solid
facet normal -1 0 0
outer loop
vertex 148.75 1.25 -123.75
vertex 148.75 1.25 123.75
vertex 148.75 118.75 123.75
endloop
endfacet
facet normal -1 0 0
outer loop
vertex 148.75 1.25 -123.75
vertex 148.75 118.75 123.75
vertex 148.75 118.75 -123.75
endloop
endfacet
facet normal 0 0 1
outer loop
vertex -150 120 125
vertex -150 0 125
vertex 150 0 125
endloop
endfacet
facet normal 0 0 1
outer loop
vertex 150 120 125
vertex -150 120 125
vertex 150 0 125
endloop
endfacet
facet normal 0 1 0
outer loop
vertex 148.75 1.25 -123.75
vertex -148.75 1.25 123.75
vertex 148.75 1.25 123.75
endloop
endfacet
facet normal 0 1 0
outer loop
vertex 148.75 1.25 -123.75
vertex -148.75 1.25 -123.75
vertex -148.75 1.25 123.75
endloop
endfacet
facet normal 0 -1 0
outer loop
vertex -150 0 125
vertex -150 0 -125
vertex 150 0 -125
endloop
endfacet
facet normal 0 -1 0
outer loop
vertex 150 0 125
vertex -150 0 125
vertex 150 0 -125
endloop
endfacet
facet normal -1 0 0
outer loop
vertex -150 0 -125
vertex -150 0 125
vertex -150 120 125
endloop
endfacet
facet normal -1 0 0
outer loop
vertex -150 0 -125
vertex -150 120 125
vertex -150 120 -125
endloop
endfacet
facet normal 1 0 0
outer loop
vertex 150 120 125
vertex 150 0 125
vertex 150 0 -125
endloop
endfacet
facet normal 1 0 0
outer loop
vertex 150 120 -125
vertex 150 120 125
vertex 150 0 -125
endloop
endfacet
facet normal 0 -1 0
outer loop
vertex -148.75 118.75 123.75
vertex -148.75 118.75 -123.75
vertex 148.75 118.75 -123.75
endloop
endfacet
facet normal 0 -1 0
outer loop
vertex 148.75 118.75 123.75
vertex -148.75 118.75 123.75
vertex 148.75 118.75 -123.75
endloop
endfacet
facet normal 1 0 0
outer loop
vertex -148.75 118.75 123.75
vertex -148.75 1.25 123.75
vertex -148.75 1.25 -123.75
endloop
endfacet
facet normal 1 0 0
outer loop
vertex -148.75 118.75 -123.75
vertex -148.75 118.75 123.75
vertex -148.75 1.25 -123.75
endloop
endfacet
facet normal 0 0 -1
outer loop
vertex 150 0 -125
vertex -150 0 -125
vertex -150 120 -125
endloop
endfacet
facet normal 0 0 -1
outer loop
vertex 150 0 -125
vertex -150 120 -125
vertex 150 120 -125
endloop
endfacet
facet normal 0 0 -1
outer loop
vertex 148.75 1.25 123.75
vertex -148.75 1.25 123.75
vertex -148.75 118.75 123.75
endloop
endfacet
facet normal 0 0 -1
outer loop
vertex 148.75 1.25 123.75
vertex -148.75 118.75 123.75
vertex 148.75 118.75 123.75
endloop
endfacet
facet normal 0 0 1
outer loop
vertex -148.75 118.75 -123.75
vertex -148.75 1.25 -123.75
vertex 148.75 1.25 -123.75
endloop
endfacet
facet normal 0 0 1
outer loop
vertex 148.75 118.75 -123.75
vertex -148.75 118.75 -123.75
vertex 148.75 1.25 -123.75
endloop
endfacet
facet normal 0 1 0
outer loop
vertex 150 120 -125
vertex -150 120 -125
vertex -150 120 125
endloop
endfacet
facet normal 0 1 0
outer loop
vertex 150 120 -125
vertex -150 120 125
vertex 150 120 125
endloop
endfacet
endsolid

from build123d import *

# Parameters (mm, degrees)
SKETCH1_W           = 300
SKETCH1_H           = 250
BOSS_EXTRUDE1_DEPTH = 1.25
SKETCH5_W           = 300
SKETCH5_H           = 250
SKETCH5_W_2         = 297.5
SKETCH5_H_2         = 247.5
BOSS_EXTRUDE2_DEPTH = 120
SKETCH6_W           = 300
SKETCH6_H           = 250
BOSS_EXTRUDE3_DEPTH = 1.25


with BuildPart() as part:
    # Sketch1 → Boss-Extrude1 (new body)
    with BuildSketch(Plane(origin=(0, 0, 0), x_dir=(1, 0, 0), z_dir=(0, 1, 0))):
        Rectangle(SKETCH1_W, SKETCH1_H)
    extrude(amount=BOSS_EXTRUDE1_DEPTH)

    # Sketch5 → Boss-Extrude2 (add)
    with BuildSketch(Plane(origin=(0, 0, 0), x_dir=(1, 0, 0), z_dir=(0, 1, 0))):
        Rectangle(SKETCH5_W, SKETCH5_H)
        Rectangle(SKETCH5_W_2, SKETCH5_H_2, mode=Mode.SUBTRACT)
    extrude(amount=BOSS_EXTRUDE2_DEPTH)

    # Sketch6 → Boss-Extrude3 (add)
    with BuildSketch(Plane(origin=(0, 120, 0), x_dir=(1, 0, 0), z_dir=(0, 1, 0))):
        Rectangle(SKETCH6_W, SKETCH6_H)
    extrude(amount=-BOSS_EXTRUDE3_DEPTH)


solid = part.part
